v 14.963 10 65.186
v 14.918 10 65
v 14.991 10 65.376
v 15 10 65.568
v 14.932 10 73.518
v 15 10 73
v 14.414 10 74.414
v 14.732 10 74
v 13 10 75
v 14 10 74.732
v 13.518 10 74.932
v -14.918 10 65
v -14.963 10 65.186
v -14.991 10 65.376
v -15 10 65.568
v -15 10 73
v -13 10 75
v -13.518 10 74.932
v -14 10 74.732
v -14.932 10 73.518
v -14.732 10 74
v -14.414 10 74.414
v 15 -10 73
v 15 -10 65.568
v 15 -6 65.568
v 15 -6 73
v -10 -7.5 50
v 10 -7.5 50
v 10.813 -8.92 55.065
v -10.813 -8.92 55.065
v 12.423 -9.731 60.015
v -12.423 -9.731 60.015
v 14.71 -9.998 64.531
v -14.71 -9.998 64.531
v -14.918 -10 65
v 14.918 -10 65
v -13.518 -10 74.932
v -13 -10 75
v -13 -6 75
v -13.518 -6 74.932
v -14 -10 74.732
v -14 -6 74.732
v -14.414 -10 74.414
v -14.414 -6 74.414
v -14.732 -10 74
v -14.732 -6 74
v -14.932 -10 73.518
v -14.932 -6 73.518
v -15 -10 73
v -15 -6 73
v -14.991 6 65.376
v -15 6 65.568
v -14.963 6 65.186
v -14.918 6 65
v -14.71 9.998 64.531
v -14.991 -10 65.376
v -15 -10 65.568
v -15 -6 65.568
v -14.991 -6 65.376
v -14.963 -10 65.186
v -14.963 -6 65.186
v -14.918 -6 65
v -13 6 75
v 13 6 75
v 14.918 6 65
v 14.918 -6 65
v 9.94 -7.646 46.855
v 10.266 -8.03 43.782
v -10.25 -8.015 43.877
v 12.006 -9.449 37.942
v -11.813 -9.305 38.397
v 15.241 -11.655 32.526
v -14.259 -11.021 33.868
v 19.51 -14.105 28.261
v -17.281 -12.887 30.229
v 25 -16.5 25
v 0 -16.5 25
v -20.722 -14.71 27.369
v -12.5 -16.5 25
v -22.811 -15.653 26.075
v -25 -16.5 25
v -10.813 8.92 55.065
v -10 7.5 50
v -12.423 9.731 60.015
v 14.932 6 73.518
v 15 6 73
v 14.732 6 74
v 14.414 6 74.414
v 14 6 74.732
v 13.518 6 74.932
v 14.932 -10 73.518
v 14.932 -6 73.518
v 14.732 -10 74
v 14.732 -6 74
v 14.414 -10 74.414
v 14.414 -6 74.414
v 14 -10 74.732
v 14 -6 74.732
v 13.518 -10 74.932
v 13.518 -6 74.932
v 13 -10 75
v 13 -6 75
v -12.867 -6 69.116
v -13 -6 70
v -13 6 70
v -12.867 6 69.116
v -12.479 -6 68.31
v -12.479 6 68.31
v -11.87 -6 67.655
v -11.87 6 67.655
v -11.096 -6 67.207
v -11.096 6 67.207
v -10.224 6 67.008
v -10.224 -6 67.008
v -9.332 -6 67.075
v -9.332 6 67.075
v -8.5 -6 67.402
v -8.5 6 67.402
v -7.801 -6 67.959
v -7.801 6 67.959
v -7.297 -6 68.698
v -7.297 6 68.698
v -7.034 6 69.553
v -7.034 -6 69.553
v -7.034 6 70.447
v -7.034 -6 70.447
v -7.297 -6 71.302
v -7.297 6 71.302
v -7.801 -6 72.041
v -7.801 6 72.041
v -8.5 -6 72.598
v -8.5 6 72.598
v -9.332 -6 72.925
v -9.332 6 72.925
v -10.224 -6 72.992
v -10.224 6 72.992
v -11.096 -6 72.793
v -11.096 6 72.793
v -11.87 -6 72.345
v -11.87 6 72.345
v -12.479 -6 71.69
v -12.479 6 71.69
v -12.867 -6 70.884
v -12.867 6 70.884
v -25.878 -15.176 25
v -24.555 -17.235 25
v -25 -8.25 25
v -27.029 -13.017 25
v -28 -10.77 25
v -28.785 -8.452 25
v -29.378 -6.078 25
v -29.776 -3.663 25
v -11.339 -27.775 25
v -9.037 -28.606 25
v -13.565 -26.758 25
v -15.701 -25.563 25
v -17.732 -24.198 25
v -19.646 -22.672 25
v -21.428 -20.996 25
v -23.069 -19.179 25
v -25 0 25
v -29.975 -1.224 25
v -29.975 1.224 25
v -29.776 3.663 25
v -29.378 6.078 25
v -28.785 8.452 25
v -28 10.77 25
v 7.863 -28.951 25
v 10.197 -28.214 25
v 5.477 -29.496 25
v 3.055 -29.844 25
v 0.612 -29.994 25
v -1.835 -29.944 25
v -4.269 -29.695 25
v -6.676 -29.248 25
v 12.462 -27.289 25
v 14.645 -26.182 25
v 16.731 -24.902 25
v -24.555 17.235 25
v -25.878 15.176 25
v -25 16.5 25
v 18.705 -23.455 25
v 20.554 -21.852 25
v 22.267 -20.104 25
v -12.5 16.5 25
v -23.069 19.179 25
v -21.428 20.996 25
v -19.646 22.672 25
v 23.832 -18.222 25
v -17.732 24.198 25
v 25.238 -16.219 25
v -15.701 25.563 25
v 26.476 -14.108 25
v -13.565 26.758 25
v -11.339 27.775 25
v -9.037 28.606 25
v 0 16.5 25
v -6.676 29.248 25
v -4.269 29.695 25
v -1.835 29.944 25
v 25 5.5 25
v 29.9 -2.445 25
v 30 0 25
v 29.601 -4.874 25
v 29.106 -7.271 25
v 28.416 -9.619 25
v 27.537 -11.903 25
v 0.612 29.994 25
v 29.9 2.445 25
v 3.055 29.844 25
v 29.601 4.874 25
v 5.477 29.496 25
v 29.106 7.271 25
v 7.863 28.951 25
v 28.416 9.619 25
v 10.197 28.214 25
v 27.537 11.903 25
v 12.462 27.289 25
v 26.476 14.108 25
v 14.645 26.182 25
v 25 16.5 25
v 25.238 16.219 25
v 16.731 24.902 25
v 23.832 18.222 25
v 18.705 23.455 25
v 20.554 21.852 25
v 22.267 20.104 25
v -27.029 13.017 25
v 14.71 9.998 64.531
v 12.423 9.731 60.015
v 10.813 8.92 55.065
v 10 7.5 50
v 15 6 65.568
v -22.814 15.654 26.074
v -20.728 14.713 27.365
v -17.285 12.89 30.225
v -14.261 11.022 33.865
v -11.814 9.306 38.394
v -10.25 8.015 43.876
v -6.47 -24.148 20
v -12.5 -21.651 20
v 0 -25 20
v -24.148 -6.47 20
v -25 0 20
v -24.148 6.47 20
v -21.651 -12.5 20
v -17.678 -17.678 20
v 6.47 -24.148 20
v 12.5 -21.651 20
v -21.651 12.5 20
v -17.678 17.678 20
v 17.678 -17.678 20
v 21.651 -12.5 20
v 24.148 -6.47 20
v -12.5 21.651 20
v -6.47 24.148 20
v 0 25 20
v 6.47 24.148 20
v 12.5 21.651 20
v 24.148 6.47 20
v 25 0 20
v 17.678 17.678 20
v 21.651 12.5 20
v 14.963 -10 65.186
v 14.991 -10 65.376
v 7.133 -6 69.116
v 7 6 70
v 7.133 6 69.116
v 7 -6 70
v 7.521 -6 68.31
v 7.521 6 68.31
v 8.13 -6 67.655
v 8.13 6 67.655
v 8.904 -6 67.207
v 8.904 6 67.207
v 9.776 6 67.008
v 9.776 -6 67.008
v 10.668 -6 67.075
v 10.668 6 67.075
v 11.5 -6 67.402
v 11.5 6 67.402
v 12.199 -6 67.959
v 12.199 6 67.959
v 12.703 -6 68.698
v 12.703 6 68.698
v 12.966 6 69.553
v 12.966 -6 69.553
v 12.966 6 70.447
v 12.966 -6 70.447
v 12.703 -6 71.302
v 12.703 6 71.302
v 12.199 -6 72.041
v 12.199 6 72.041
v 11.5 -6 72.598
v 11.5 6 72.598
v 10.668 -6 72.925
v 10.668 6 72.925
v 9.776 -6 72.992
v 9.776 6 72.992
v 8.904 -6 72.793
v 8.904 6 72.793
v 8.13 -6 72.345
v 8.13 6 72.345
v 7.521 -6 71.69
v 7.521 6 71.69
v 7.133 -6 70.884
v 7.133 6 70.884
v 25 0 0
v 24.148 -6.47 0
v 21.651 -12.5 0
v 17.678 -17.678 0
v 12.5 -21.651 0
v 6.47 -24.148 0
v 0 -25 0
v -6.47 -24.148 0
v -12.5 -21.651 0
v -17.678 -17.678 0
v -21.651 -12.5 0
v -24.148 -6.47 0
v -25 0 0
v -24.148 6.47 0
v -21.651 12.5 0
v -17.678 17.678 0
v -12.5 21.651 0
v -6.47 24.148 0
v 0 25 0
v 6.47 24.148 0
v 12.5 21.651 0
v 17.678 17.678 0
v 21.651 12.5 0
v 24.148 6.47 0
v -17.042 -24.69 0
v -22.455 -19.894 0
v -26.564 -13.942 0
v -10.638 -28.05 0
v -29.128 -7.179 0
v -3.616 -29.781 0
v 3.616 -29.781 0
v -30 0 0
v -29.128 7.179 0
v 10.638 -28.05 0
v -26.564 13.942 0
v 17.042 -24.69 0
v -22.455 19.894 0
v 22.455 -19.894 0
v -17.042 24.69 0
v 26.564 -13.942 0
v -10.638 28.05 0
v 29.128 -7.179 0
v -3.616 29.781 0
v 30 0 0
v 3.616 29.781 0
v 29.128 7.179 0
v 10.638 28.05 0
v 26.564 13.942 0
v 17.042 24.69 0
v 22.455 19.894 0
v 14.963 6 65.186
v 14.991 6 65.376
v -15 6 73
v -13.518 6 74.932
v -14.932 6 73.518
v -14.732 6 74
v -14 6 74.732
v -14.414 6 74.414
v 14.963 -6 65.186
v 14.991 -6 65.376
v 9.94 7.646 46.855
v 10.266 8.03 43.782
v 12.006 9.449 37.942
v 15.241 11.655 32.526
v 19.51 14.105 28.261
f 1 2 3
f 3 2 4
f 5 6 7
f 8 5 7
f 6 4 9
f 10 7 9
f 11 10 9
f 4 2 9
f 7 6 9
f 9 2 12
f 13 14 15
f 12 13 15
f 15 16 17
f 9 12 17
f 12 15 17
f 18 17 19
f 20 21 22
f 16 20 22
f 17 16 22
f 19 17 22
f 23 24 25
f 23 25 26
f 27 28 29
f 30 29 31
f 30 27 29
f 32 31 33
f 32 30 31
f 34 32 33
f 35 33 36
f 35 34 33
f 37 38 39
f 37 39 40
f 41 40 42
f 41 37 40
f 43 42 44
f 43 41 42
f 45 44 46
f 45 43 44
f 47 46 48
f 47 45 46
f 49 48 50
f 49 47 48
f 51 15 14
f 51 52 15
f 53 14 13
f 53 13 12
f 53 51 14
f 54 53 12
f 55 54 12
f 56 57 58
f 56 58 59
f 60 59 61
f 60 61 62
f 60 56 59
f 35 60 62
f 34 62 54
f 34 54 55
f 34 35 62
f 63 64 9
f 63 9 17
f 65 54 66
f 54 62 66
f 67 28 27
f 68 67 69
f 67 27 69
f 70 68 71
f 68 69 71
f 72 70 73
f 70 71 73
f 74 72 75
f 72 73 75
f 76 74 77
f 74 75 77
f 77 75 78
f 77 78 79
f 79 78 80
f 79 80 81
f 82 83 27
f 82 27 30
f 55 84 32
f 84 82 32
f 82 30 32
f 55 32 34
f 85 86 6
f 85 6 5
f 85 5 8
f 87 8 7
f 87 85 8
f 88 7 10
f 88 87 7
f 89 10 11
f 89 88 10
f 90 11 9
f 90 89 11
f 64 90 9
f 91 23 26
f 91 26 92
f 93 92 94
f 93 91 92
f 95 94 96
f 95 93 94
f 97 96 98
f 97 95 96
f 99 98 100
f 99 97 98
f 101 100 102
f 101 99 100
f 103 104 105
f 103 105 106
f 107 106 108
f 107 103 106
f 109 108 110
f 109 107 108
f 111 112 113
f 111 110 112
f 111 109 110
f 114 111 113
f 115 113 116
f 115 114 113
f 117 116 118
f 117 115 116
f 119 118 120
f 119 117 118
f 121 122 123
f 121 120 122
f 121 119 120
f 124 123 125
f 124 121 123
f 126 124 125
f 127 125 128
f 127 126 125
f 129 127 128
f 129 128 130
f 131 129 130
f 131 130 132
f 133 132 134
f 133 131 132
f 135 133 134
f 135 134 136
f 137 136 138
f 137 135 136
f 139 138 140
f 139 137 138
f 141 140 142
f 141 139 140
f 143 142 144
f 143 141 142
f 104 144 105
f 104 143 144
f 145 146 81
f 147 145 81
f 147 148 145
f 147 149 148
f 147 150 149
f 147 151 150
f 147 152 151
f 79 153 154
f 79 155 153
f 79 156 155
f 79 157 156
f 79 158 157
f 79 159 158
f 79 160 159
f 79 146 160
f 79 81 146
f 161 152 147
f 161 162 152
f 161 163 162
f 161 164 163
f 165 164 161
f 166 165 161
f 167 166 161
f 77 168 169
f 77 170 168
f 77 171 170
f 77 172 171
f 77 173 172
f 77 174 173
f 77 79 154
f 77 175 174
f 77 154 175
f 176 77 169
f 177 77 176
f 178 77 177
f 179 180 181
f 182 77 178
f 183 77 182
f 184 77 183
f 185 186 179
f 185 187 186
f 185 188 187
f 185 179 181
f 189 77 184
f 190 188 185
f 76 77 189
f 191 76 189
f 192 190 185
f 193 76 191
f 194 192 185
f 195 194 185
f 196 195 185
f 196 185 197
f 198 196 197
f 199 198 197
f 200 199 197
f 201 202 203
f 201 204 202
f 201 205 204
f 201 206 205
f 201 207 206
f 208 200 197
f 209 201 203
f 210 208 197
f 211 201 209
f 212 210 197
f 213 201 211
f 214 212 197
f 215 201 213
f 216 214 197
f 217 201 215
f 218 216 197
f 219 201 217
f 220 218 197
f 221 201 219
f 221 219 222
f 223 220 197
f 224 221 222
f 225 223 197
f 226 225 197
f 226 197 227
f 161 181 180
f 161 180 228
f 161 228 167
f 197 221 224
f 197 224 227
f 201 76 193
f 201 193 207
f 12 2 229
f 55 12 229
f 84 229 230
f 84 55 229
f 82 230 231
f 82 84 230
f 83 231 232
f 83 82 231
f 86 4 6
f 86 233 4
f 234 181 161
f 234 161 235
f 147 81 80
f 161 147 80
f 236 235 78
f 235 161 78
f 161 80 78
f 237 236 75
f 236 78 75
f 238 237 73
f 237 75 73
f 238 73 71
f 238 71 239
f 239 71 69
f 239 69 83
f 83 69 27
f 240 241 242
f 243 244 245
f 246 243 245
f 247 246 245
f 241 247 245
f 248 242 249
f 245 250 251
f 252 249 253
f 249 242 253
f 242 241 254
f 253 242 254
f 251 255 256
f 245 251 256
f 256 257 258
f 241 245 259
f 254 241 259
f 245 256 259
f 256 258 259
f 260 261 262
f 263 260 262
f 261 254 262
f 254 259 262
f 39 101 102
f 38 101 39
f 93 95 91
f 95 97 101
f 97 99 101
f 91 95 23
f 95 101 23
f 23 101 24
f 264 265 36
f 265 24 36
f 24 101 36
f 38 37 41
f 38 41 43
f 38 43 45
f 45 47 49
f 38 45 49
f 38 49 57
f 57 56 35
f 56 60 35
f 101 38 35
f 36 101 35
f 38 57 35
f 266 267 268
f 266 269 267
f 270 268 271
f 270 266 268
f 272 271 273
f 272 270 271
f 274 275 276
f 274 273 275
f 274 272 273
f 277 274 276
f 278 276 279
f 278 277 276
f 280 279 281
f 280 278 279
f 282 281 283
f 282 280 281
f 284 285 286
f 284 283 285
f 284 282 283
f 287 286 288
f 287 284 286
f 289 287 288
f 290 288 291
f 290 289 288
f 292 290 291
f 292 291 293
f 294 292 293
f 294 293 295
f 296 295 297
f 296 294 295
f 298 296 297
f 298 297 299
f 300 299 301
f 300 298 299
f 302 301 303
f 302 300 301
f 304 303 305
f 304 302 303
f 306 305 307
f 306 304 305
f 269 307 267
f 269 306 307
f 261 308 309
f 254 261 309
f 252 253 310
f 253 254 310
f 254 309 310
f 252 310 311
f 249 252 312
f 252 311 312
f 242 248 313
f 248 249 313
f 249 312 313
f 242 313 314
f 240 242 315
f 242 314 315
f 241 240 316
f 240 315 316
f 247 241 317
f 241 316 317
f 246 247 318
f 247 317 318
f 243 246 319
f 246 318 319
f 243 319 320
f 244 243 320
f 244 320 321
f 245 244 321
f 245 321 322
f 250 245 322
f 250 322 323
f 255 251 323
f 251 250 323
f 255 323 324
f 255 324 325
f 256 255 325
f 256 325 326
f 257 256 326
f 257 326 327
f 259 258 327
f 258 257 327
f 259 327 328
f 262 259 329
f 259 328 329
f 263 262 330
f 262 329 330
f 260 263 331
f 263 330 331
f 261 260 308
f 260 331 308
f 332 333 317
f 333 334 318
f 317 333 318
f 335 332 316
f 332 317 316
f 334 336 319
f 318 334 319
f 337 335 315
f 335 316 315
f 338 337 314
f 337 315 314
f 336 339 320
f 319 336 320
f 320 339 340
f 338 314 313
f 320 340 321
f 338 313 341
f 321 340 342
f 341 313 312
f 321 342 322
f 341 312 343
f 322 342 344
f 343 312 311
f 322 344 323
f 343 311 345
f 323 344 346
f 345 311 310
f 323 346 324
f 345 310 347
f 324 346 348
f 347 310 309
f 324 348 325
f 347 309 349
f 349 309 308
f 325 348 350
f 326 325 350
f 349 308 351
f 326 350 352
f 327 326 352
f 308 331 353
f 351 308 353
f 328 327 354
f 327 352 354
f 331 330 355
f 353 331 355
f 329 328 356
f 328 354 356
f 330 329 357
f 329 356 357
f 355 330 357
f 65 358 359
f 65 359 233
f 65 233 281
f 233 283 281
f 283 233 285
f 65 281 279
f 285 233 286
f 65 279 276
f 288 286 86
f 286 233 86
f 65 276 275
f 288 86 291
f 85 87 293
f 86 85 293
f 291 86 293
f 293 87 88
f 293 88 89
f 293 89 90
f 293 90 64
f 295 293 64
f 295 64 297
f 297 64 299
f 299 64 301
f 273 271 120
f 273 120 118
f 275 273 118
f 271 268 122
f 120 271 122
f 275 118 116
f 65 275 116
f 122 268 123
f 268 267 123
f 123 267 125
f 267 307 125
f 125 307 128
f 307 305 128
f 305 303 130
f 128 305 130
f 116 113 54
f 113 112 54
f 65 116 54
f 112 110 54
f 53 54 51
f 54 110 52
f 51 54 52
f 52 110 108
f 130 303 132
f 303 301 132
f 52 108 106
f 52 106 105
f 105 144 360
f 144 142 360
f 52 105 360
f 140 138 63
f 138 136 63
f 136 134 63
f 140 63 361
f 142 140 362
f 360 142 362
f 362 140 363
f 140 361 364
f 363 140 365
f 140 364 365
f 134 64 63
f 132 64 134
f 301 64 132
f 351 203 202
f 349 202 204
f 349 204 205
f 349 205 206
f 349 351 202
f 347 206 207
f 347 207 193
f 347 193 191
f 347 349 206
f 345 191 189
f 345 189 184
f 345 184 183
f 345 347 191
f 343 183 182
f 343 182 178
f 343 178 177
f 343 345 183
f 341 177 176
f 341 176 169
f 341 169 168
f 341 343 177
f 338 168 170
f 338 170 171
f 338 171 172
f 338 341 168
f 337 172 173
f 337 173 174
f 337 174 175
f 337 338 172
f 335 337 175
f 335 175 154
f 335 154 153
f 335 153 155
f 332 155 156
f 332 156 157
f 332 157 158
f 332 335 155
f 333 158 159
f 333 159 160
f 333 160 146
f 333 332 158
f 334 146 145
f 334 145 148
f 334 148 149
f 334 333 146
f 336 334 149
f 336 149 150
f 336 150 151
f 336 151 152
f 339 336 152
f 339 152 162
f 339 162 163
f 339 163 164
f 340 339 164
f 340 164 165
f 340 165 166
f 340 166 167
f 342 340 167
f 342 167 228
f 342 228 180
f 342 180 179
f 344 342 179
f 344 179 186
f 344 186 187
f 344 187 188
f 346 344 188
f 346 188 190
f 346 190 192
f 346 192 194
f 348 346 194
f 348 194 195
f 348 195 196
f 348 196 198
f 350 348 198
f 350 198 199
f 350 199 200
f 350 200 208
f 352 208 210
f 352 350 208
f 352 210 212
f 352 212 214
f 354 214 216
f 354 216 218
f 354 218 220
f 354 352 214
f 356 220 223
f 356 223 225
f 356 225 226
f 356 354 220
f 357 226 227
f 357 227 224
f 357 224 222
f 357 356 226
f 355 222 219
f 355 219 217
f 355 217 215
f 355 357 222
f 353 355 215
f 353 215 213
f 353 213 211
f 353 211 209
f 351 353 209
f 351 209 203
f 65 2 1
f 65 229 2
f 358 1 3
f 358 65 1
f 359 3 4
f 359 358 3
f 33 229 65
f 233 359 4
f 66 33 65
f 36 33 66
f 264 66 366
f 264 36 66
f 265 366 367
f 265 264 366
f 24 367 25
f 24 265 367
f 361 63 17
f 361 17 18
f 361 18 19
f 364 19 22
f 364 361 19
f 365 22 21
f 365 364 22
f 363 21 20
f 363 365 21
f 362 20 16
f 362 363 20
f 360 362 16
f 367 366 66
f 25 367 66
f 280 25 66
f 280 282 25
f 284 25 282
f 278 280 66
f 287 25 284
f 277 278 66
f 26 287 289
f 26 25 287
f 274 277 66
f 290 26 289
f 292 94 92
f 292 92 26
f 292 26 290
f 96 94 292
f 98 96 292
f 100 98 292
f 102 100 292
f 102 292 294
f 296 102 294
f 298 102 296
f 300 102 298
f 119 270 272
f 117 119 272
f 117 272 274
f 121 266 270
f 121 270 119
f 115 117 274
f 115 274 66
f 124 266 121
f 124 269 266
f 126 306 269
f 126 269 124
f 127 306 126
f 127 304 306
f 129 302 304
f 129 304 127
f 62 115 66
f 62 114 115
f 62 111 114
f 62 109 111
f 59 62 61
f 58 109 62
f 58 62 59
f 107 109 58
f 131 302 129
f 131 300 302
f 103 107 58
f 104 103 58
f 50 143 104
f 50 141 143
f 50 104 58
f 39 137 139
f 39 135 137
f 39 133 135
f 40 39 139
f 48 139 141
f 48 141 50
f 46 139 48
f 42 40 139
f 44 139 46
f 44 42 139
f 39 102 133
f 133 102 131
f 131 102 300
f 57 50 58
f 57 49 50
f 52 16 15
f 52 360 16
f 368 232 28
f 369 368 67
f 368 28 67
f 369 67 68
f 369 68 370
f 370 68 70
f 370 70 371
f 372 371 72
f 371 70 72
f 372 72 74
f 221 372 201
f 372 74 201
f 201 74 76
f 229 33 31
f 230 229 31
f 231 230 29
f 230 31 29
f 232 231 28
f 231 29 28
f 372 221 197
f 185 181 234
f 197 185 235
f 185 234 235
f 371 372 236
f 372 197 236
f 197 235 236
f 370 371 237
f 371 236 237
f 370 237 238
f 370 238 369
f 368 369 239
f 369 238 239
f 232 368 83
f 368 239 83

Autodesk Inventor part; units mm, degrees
ref_plane "YZ Plane" through (0, 0, 0) normal (1, 0, 0) x (0, 1, 0)
ref_plane "XZ Plane" through (0, 0, 0) normal (0, 1, 0) x (-1, 0, 0)
ref_plane "XY Plane" through (0, 0, 0) normal (0, 0, 1) x (1, 0, 0)
sketch "Sketch1" plane through (0, 0, 0) normal (0, 0, 1) x (1, 0, 0)
  circle A0 centre (0, 0) radius 25
  circle A1 centre (0, 0) radius 30
  dimension "d0" = 50
  dimension "d1" = 60
extrude "Extrusion1" add sketch "Sketch1" along normal blind 20
sketch "Sketch2" plane through (0, 0, 20) normal (0, 0, 1) x (1, 0, 0)
  circle A0 centre (0, 0) radius 30 projected
extrude "Extrusion2" add sketch "Sketch2" along normal blind 5
sketch "Sketch3" plane through (0, 0, 0) normal (0, 1, 0) x (-1, 0, 0)
  line L0 (30, 25) -> (-30, 25) projected
  arc A0 (-25, 25) -> (-10, 50) centre (-34.9158, 47.9495) ccw
  arc A1 (10, 50) -> (25, 25) centre (34.9158, 47.9495) ccw
  line L1 (-25, 20) -> (-25, 0) projected
  line L2 (25, 20) -> (25, 0) projected
  line L3 (-10, 50) -> (10, 50)
  arc A2 (-10, 50) -> (-23.3636, 64.782) centre (-26.3452, 48.6548) ccw construction
  line L4 (-10, 50) -> (-25, 65) construction
  line L5 (-10, 50) -> (11.2132, 50) construction
  arc A3 (23.3636, 64.782) -> (10, 50) centre (26.3452, 48.6548) ccw construction
  line L6 (-23, 75) -> (13, 75) construction
  line L7 (-25, 66.7486) -> (-25, 73) construction
  line L8 (25, 66.7486) -> (25, 73) construction
  arc A4 (-23, 75) -> (-25, 73) centre (-23, 73) ccw construction
  arc A5 (-25, 66.7486) -> (-23.3636, 64.782) centre (-23, 66.7486) ccw construction
  arc A6 (23.3636, 64.782) -> (25, 66.7486) centre (23, 66.7486) ccw construction
  arc A7 (25, 73) -> (23, 75) centre (23, 73) ccw construction
  line L9 (-13, 75) -> (15, 75)
  line L10 (15, 73) -> (15, 65.5675)
  line L11 (15, 65) -> (-15, 65) construction
  line L12 (-15, 65.5675) -> (-15, 73)
  arc A8 (-10, 50) -> (-14.7104, 64.531) centre (-43.196, 47.268) ccw
  arc A9 (14.7104, 64.531) -> (10, 50) centre (43.196, 47.268) ccw
  arc A10 (-15, 65.5675) -> (-14.7104, 64.531) centre (-13, 65.5675) ccw
  arc A11 (-13, 75) -> (-15, 73) centre (-13, 73) ccw
  arc A12 (15, 73) -> (13, 75) centre (13, 73) ccw
  arc A13 (14.7104, 64.531) -> (15, 65.5675) centre (13, 65.5675) ccw
  point P0 (0, 0)
  point P1 (25, 65)
  point P2 (-15, 75)
  dimension "d6" = 25
  dimension "d7" = 25
  dimension "d8" = 20
  dimension "d9" = 10
  dimension "d10" = 25
  dimension "d11" = 135
  dimension "d12" = 135
  dimension "d13" = 10
  dimension "d14" = 2
  dimension "d33" = 50
  dimension "d34" = 30
  dimension "d35" = 15
  dimension "d36" = 10
  dimension "d37" = 15
  dimension "d38" = 2
extrude "Extrusion3" add sketch "Sketch3" along normal mid plane 33
sketch "Sketch6" plane through (0, 0, 0) normal (1, 0, 0) x (0, 1, 0)
  line L0 (16.5, 25) -> (-16.5, 25) projected
  line L1 (16.5, 50) -> (-16.5, 50) projected
  line L2 (0, 50) -> (7.5, 50)
  line L3 (0, 50) -> (-7.5, 50)
  line L4 (-16.5, 25) -> (-16.5, 50) projected
  arc A0 (-16.5, 25) -> (-7.5, 50) centre (-47.499, 50.2796) ccw
  line L5 (16.5, 50) -> (16.5, 25) projected
  arc A1 (7.5, 50) -> (16.5, 25) centre (47.499, 50.2796) ccw
  line L6 (-16.5, 75) -> (16.5, 75) projected
  line L7 (10, 75) -> (-10, 75)
  line L8 (-10, 75) -> (-10, 65)
  line L9 (-10, 65) -> (10, 65)
  line L10 (10, 65) -> (10, 75)
  arc A2 (7.5, 50) -> (10, 65) centre (-36.25, 65) ccw
  arc A3 (-10, 65) -> (-7.5, 50) centre (36.25, 65) ccw
  line L11 (16.5, 64.531) -> (16.5, 50) projected
  line L12 (16.5, 50) -> (16.5, 75)
  line L13 (-16.5, 50) -> (-16.5, 64.531) projected
  line L14 (-16.5, 75) -> (-16.5, 50)
  point P0 (0, 0)
  dimension "d39" = 7.5
  dimension "d40" = 7.5
  dimension "d41" = 40
  dimension "d42" = 40
  dimension "d43" = 20
  dimension "d44" = 10
  dimension "d46" = 20
  dimension "d47" = 10
  dimension "d48" = 10
extrude "Extrusion6" cut sketch "Sketch6" along normal through all both and the other way through all contours A1 L1 L5 | L4 L1 A0 | L1 A2 L10 L6 L12 L11 | L13 L14 L6 L8 A3 L1
sketch "Sketch7" plane through (0, 0, 0) normal (0, 1, 0) x (-1, 0, 0)
  arc A0 (14.9178, 65) -> (15, 65.5675) centre (13, 65.5675) ccw projected
  line L0 (14.9178, 65) -> (-14.9178, 65) projected
  arc A1 (-15, 65.5675) -> (-14.9178, 65) centre (-13, 65.5675) ccw projected
  line L1 (-15, 73) -> (-15, 65.5675) projected
  arc A2 (-13, 75) -> (-15, 73) centre (-13, 73) ccw projected
  line L2 (13, 75) -> (-13, 75) projected
  arc A3 (15, 73) -> (13, 75) centre (13, 73) ccw projected
  line L3 (15, 65.5675) -> (15, 73) projected
  circle A4 centre (10, 70) radius 3
  circle A5 centre (-10, 70) radius 3
  point P0 (0, 0)
  dimension "d51" = 6
  dimension "d52" = 6
  dimension "d53" = 5
  dimension "d54" = 5
  dimension "d55" = 5
  dimension "d56" = 5
extrude "Extrusion7" cut sketch "Sketch7" along normal mid plane 12
properties part number "Arm 6 v0.1"
